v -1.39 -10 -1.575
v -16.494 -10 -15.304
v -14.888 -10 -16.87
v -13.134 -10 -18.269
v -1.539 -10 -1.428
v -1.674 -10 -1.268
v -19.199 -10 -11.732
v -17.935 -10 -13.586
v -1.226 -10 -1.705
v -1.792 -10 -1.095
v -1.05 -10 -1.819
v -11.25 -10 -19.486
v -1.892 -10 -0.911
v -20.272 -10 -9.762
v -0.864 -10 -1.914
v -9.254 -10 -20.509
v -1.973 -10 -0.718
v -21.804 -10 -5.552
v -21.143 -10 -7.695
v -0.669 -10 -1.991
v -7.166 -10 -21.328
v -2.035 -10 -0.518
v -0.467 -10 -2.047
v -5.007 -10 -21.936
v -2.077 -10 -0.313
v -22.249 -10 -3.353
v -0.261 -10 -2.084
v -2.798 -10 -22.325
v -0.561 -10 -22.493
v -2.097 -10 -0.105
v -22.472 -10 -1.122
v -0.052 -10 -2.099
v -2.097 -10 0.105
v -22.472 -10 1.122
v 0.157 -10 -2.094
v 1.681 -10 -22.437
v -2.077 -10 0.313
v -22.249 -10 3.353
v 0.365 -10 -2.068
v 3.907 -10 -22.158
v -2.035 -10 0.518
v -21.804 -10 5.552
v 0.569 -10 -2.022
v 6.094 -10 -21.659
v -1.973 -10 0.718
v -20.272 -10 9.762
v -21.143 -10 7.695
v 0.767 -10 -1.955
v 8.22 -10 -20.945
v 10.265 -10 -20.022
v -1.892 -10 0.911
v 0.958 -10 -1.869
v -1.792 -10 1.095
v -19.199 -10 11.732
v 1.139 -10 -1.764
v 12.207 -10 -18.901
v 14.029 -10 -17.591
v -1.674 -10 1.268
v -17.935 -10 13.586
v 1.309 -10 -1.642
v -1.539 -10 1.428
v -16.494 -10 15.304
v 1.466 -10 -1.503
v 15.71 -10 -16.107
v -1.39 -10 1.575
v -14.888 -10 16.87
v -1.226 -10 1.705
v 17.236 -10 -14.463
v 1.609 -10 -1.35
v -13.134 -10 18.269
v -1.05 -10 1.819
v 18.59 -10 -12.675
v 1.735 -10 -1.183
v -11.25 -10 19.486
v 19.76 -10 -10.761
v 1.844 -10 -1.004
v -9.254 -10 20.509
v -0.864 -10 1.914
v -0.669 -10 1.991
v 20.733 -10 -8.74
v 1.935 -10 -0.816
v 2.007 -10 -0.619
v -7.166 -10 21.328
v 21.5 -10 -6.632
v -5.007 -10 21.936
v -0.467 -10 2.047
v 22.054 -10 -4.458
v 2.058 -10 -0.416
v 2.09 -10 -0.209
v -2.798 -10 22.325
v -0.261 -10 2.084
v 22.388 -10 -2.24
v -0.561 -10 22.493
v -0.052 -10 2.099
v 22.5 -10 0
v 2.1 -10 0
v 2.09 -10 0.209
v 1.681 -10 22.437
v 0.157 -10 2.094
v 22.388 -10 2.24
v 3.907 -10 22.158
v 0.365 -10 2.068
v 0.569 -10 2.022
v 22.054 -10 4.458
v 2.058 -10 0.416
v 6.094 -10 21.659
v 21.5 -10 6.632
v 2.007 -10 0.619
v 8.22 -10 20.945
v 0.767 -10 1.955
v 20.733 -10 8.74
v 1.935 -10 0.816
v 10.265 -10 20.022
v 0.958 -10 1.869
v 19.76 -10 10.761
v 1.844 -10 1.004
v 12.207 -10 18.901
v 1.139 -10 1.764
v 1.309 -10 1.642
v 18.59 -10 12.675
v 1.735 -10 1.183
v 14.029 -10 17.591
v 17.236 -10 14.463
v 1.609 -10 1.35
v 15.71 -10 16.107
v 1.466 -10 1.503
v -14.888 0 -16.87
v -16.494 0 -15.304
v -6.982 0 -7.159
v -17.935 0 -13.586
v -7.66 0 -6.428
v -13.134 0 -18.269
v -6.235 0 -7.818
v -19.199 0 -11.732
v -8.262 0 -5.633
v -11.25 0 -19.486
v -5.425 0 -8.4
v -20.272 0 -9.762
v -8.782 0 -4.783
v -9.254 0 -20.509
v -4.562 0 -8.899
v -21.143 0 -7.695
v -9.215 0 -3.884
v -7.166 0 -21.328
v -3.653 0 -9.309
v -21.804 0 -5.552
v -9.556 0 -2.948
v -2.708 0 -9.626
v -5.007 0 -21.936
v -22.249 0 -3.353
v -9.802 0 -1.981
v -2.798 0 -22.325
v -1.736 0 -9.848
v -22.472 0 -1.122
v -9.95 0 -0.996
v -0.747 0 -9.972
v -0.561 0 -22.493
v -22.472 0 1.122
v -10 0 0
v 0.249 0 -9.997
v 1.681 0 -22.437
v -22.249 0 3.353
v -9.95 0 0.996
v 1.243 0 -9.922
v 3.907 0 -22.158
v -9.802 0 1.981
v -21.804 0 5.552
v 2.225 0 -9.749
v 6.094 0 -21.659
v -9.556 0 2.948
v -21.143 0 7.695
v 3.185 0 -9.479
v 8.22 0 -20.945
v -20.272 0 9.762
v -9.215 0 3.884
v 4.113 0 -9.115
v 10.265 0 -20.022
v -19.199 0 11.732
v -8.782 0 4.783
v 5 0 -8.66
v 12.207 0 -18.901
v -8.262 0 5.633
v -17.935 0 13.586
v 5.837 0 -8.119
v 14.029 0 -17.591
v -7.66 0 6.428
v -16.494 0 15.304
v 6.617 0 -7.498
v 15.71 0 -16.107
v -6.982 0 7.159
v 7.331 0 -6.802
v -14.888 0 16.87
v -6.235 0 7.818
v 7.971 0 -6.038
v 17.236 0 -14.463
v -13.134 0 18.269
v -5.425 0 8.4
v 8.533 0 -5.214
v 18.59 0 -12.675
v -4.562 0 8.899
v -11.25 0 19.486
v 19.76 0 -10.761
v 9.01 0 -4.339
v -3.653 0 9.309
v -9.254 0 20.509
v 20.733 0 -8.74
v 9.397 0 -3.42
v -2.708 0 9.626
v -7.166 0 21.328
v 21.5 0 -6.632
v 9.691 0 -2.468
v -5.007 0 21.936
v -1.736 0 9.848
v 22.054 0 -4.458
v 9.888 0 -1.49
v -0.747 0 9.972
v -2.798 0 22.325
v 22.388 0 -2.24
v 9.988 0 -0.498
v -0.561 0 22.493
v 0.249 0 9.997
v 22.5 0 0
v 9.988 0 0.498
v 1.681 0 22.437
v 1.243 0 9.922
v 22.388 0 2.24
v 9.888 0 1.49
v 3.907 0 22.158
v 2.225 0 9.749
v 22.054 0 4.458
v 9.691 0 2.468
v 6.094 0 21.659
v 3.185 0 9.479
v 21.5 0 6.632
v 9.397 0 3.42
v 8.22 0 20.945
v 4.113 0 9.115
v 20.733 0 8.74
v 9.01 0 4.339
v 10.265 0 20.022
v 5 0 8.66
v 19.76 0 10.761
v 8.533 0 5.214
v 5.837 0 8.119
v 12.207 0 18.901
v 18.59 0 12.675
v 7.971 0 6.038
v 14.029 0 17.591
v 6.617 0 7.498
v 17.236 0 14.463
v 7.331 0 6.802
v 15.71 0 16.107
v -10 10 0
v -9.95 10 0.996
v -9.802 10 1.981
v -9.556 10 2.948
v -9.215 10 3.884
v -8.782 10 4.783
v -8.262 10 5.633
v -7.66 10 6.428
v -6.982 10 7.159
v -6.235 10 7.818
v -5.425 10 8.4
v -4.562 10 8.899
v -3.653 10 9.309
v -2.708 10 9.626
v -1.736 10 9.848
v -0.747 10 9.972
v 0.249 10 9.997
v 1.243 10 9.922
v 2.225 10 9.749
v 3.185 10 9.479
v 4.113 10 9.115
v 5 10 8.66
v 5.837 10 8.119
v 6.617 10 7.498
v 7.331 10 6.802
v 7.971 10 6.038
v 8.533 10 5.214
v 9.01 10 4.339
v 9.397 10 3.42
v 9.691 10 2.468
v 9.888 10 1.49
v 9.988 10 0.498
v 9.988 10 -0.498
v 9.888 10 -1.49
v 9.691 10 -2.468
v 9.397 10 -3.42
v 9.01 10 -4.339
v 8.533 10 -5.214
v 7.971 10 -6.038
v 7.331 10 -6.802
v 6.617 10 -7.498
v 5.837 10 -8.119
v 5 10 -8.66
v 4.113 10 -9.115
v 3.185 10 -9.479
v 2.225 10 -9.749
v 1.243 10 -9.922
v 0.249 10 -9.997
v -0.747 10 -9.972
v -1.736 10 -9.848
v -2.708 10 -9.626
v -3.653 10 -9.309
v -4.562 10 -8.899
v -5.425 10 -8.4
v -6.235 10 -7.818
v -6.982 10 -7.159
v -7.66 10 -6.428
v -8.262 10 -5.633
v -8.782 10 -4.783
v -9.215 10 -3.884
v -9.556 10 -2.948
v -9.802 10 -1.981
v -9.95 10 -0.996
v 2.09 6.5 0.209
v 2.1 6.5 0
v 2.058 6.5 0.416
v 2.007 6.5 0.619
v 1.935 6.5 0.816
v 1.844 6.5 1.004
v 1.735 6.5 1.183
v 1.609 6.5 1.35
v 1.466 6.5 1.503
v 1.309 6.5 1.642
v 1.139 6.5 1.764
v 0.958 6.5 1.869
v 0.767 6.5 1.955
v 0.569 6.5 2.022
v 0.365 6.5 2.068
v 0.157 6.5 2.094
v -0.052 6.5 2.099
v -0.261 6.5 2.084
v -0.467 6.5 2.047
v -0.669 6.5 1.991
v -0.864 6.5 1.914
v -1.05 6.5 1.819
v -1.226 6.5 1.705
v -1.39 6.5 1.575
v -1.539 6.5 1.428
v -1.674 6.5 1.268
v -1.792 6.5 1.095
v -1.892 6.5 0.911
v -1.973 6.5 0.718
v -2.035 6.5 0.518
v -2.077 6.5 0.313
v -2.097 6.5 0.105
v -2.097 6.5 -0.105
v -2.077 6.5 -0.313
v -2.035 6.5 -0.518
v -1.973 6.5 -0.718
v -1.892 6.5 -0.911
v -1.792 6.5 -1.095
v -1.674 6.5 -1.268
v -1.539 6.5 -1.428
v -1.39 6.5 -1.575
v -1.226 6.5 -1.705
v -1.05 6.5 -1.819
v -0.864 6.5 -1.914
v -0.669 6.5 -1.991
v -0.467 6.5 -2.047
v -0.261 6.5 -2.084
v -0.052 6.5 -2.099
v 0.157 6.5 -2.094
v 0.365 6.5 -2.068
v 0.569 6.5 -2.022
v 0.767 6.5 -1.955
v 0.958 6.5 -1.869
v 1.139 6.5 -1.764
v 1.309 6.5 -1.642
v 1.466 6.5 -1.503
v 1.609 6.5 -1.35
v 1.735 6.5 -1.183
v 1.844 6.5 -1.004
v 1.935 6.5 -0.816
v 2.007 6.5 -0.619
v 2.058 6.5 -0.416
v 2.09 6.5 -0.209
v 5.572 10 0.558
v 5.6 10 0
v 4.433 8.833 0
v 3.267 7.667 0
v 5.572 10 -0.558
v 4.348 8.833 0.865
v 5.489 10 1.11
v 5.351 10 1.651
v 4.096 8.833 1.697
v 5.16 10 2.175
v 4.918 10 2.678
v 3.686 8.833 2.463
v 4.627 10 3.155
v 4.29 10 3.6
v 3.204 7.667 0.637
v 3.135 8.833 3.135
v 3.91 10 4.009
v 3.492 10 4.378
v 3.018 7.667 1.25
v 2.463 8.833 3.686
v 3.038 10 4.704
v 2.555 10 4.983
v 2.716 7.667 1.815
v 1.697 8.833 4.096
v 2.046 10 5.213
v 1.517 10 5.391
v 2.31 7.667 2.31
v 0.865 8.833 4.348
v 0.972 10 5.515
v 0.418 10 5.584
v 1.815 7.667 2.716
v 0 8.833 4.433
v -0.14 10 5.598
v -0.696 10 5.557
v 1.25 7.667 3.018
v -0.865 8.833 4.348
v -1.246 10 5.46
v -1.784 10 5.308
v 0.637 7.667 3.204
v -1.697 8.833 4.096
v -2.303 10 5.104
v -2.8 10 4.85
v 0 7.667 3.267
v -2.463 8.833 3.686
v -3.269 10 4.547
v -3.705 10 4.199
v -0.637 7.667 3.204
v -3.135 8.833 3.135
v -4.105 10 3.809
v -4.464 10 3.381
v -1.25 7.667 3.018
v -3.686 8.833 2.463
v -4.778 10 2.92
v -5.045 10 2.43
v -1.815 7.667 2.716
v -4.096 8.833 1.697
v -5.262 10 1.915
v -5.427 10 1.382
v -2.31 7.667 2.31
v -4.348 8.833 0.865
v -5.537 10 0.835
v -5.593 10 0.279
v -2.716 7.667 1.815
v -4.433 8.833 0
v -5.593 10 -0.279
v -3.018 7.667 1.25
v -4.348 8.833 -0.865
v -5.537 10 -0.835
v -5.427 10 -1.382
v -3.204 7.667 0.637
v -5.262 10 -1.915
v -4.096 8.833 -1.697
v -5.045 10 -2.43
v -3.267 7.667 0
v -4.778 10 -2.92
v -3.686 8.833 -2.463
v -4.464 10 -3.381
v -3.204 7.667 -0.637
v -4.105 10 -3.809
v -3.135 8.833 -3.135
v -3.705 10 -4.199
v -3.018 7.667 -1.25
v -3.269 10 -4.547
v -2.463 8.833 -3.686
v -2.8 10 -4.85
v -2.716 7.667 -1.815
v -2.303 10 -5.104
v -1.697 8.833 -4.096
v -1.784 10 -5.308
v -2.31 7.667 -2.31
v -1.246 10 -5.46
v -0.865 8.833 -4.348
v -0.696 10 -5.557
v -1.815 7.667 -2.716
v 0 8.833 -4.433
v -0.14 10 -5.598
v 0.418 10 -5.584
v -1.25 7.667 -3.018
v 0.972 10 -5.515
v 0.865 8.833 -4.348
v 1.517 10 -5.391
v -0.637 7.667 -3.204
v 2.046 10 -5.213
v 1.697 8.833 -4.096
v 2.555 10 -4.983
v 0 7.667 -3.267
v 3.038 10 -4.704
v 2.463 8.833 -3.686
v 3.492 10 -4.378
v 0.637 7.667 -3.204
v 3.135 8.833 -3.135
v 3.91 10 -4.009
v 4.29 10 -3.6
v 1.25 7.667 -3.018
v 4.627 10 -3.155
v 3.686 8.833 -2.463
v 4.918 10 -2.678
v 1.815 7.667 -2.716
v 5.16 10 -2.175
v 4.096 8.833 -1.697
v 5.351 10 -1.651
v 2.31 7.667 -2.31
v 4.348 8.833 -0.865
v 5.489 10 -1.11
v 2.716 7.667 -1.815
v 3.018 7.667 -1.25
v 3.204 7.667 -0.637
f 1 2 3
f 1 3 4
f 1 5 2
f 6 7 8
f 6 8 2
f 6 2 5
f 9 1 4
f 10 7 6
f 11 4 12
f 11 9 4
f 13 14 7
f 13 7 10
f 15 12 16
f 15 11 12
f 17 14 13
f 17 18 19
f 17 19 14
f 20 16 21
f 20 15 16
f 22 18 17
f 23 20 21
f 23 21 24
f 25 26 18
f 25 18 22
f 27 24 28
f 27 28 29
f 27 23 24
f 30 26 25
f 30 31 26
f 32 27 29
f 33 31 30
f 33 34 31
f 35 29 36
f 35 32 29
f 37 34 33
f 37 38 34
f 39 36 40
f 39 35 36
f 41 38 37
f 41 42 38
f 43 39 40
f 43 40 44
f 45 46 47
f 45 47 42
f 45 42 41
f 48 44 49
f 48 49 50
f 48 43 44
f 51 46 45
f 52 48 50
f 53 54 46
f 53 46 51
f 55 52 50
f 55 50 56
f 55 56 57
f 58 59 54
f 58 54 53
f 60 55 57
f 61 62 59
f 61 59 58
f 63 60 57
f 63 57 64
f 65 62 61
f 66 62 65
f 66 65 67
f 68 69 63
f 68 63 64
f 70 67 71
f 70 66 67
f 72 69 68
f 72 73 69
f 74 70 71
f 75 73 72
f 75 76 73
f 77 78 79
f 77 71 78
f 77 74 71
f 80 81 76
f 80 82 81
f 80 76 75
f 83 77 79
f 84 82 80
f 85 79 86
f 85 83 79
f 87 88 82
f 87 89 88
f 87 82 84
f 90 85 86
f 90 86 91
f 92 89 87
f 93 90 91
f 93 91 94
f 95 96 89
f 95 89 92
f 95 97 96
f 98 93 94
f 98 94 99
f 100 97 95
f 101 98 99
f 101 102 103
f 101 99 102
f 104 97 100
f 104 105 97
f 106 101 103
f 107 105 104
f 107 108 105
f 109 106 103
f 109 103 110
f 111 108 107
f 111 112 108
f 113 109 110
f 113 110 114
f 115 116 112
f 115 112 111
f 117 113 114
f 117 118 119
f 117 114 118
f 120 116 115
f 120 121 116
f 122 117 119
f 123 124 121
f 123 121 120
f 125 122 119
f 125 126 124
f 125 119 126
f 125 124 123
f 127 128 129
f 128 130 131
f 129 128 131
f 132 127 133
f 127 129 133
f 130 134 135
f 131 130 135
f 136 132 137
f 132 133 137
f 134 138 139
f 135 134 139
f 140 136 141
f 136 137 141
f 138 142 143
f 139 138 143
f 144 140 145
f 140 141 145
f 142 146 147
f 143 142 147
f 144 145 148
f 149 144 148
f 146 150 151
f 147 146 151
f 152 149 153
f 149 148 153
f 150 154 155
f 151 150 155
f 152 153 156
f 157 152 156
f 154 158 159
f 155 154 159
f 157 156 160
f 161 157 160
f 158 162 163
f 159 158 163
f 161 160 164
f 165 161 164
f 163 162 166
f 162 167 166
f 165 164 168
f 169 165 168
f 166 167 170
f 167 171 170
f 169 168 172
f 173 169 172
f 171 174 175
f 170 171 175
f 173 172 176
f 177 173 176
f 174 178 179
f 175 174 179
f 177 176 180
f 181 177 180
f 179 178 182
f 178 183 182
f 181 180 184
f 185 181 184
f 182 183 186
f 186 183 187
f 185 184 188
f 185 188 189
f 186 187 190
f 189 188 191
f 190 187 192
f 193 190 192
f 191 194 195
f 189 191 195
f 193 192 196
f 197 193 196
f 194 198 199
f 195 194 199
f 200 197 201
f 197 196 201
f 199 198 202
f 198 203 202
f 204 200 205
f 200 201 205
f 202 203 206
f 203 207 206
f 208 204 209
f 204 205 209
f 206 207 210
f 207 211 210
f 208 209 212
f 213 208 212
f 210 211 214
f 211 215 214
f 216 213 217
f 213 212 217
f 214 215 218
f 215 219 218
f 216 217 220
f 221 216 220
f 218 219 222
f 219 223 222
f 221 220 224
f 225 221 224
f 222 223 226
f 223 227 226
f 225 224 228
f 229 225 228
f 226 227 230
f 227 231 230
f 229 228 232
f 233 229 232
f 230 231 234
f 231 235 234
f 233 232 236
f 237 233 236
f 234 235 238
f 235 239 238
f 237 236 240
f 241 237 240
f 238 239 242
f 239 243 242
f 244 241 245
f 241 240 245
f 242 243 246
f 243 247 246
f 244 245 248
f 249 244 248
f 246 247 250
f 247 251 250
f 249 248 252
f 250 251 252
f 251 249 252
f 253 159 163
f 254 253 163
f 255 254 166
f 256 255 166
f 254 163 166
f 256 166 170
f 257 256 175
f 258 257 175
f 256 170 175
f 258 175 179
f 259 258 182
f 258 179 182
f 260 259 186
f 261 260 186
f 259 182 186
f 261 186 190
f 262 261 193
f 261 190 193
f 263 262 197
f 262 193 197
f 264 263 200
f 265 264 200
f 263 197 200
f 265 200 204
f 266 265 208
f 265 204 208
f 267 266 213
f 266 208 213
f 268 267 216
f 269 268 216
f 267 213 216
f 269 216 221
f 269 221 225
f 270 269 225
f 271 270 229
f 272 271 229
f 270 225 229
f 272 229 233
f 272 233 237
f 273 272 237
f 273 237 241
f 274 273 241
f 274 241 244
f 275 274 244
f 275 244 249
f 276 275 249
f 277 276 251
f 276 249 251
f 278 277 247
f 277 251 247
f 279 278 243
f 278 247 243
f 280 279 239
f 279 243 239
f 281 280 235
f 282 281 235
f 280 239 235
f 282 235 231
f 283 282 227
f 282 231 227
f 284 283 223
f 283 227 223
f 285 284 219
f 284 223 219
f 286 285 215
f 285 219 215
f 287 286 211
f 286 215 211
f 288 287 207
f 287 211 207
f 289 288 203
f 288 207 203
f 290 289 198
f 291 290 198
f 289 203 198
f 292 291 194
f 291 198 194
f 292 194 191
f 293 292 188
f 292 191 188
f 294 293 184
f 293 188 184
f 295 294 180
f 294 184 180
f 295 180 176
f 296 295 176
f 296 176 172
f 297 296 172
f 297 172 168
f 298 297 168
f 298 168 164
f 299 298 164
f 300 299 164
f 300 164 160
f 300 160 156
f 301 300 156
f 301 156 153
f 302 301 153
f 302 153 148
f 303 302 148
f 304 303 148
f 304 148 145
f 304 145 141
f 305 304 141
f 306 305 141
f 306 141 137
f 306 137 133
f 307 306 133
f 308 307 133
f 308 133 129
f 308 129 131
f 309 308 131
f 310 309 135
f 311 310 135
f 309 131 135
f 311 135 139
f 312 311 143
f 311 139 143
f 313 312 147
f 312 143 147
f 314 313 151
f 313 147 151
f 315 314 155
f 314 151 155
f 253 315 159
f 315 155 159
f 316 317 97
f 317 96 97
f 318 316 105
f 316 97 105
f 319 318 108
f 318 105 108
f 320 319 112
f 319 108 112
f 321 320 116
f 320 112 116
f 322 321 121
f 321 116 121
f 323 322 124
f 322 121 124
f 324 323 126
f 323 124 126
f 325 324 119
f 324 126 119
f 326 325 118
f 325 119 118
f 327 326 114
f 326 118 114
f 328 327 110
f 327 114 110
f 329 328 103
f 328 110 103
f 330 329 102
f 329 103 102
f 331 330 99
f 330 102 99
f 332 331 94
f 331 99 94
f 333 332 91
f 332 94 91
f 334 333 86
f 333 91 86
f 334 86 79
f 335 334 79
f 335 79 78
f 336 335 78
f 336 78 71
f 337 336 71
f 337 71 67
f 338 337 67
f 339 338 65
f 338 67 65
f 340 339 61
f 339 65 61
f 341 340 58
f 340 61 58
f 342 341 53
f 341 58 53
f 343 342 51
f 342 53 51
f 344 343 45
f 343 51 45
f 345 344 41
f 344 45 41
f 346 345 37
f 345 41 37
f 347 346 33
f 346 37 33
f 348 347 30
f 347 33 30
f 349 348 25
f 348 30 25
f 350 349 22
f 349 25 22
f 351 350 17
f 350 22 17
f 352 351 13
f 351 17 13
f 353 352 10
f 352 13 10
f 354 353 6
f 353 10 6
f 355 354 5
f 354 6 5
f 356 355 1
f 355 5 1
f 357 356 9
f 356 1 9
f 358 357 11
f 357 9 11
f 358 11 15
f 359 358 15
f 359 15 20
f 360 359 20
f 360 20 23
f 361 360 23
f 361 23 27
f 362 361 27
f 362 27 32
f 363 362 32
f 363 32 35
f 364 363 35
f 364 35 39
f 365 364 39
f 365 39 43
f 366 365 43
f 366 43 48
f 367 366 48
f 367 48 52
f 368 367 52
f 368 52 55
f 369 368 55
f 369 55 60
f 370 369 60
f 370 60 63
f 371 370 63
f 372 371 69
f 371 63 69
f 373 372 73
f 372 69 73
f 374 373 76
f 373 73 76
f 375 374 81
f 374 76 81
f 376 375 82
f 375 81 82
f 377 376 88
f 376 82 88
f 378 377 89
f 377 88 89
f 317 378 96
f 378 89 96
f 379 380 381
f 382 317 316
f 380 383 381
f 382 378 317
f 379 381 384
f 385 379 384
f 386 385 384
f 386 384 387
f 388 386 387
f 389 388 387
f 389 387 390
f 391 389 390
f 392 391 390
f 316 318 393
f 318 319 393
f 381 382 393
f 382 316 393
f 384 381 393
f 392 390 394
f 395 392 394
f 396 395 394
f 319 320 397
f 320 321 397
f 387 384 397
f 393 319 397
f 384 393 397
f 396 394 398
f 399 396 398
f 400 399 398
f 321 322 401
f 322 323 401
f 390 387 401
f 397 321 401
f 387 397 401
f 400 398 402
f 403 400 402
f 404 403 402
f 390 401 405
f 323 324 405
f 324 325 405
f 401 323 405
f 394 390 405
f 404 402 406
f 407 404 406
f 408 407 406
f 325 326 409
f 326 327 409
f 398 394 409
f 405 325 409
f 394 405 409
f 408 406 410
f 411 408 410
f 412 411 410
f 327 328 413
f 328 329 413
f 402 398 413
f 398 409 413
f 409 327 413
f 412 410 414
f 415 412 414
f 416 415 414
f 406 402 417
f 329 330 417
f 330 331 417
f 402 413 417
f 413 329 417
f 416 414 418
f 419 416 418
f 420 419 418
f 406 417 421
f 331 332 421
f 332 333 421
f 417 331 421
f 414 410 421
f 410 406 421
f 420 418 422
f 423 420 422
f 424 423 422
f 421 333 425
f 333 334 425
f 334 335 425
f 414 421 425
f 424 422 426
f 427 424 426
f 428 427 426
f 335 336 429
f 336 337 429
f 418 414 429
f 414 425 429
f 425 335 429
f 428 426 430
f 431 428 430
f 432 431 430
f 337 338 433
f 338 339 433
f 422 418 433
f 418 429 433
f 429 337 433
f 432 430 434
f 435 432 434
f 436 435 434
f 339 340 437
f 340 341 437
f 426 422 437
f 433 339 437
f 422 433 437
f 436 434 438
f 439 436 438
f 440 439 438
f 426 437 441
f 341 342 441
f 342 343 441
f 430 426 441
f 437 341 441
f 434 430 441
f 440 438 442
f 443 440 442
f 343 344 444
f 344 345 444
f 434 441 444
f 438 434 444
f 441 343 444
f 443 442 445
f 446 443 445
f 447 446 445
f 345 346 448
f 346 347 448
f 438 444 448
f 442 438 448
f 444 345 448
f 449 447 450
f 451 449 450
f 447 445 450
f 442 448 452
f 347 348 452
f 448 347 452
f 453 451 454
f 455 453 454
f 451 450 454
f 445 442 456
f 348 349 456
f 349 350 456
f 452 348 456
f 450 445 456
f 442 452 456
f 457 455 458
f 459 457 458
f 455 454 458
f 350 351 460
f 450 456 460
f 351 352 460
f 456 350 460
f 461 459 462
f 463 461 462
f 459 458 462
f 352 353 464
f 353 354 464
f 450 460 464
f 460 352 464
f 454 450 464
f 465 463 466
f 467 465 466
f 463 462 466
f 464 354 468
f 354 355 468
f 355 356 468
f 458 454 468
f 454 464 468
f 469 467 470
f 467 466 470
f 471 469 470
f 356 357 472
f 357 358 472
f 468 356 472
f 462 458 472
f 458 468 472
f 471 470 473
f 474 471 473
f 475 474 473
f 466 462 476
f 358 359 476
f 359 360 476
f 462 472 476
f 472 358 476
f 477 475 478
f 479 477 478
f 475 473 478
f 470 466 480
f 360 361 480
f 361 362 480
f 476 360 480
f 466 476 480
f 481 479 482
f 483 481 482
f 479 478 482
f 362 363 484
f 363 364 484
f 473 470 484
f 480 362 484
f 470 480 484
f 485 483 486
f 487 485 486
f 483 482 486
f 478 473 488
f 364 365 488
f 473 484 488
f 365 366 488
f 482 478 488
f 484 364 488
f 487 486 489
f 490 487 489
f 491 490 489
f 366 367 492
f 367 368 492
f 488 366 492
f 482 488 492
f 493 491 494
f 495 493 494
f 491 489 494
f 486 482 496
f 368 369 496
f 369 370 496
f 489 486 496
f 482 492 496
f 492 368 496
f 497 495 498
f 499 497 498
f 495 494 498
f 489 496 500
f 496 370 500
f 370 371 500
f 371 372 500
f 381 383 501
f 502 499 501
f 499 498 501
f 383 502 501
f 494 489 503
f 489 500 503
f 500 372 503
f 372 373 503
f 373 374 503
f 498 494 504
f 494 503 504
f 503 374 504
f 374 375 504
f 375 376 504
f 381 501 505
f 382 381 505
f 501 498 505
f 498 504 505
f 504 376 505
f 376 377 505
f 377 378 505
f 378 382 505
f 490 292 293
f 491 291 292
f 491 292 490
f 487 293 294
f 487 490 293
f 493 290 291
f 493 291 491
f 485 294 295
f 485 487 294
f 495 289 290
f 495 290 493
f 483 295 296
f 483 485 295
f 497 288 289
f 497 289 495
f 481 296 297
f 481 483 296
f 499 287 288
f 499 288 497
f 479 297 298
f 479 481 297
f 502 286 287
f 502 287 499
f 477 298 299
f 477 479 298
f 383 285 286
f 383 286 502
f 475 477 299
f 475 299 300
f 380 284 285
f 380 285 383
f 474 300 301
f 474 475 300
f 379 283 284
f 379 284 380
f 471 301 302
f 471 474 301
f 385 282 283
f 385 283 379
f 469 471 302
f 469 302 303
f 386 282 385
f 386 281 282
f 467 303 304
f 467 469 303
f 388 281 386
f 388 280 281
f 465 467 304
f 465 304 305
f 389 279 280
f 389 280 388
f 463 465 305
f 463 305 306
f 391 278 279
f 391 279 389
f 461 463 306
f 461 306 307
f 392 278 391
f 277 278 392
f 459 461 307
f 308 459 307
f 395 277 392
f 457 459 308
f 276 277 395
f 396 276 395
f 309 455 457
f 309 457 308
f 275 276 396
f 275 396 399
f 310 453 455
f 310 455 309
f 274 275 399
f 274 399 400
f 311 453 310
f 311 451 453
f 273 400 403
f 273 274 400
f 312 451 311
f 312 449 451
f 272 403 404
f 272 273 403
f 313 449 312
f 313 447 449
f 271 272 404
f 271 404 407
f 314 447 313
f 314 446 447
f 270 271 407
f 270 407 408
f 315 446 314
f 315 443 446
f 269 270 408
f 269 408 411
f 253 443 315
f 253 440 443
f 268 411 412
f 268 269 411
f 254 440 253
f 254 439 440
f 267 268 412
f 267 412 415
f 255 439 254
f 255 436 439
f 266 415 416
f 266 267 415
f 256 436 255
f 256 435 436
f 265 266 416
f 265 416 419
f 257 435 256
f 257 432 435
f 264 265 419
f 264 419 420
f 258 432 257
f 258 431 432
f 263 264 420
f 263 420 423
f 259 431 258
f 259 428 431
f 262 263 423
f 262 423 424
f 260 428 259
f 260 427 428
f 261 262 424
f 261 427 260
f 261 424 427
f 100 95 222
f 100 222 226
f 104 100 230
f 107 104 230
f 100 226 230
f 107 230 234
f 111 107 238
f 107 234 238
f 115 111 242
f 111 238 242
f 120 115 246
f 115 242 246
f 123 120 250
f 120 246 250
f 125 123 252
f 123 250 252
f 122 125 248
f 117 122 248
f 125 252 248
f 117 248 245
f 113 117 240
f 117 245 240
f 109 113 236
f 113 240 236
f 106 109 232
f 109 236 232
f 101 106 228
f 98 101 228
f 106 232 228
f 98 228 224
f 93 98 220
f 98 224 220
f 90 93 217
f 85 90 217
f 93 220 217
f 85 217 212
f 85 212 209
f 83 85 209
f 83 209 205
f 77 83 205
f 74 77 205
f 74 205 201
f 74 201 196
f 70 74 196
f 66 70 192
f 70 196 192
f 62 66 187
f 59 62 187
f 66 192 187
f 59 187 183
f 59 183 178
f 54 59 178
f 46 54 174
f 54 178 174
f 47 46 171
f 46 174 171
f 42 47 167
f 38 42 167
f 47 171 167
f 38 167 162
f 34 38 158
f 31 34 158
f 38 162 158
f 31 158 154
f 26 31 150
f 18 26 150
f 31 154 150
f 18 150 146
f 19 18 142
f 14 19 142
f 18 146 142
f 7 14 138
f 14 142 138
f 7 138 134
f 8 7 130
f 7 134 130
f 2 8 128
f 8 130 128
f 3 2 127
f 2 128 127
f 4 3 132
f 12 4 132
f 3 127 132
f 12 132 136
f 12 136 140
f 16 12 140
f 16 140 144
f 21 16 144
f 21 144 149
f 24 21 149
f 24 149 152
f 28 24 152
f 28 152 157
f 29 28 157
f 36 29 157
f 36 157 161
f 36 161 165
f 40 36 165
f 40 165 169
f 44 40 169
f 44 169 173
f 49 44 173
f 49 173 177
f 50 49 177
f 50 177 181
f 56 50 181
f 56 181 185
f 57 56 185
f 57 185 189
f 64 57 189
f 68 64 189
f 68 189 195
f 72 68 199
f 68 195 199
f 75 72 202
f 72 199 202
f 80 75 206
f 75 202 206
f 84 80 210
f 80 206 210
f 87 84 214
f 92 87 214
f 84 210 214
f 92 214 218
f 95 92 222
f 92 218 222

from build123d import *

# Parameters (mm, degrees)
F0_R           = 22.5
F1_DEPTH       = 10
F2_R           = 10
F3_DEPTH       = 10
F5_D           = 4.2
F5_CSINK_D     = 11.2
F5_CSINK_ANGLE = 90


with BuildPart() as f1:
    # F0 (on Front) → F1 (new body)
    with BuildSketch(Plane.XZ):
        Circle(F0_R)
    extrude(amount=F1_DEPTH)

    # F2 (on face) → F3 (join)
    with BuildSketch(Plane(origin=(0, 0, 0), x_dir=(-1, 0, 0), z_dir=(0, 1, 0))):
        Circle(F2_R)
    extrude(amount=F3_DEPTH)

    # F5 (through all)
    with Locations(Plane(origin=(0, 10, 0), x_dir=(-1, 0, 0), z_dir=(0, 1, 0))):
        with Locations((0, 0)):
            CounterSinkHole(F5_D / 2, F5_CSINK_D / 2, counter_sink_angle=F5_CSINK_ANGLE)


solid = f1.part
